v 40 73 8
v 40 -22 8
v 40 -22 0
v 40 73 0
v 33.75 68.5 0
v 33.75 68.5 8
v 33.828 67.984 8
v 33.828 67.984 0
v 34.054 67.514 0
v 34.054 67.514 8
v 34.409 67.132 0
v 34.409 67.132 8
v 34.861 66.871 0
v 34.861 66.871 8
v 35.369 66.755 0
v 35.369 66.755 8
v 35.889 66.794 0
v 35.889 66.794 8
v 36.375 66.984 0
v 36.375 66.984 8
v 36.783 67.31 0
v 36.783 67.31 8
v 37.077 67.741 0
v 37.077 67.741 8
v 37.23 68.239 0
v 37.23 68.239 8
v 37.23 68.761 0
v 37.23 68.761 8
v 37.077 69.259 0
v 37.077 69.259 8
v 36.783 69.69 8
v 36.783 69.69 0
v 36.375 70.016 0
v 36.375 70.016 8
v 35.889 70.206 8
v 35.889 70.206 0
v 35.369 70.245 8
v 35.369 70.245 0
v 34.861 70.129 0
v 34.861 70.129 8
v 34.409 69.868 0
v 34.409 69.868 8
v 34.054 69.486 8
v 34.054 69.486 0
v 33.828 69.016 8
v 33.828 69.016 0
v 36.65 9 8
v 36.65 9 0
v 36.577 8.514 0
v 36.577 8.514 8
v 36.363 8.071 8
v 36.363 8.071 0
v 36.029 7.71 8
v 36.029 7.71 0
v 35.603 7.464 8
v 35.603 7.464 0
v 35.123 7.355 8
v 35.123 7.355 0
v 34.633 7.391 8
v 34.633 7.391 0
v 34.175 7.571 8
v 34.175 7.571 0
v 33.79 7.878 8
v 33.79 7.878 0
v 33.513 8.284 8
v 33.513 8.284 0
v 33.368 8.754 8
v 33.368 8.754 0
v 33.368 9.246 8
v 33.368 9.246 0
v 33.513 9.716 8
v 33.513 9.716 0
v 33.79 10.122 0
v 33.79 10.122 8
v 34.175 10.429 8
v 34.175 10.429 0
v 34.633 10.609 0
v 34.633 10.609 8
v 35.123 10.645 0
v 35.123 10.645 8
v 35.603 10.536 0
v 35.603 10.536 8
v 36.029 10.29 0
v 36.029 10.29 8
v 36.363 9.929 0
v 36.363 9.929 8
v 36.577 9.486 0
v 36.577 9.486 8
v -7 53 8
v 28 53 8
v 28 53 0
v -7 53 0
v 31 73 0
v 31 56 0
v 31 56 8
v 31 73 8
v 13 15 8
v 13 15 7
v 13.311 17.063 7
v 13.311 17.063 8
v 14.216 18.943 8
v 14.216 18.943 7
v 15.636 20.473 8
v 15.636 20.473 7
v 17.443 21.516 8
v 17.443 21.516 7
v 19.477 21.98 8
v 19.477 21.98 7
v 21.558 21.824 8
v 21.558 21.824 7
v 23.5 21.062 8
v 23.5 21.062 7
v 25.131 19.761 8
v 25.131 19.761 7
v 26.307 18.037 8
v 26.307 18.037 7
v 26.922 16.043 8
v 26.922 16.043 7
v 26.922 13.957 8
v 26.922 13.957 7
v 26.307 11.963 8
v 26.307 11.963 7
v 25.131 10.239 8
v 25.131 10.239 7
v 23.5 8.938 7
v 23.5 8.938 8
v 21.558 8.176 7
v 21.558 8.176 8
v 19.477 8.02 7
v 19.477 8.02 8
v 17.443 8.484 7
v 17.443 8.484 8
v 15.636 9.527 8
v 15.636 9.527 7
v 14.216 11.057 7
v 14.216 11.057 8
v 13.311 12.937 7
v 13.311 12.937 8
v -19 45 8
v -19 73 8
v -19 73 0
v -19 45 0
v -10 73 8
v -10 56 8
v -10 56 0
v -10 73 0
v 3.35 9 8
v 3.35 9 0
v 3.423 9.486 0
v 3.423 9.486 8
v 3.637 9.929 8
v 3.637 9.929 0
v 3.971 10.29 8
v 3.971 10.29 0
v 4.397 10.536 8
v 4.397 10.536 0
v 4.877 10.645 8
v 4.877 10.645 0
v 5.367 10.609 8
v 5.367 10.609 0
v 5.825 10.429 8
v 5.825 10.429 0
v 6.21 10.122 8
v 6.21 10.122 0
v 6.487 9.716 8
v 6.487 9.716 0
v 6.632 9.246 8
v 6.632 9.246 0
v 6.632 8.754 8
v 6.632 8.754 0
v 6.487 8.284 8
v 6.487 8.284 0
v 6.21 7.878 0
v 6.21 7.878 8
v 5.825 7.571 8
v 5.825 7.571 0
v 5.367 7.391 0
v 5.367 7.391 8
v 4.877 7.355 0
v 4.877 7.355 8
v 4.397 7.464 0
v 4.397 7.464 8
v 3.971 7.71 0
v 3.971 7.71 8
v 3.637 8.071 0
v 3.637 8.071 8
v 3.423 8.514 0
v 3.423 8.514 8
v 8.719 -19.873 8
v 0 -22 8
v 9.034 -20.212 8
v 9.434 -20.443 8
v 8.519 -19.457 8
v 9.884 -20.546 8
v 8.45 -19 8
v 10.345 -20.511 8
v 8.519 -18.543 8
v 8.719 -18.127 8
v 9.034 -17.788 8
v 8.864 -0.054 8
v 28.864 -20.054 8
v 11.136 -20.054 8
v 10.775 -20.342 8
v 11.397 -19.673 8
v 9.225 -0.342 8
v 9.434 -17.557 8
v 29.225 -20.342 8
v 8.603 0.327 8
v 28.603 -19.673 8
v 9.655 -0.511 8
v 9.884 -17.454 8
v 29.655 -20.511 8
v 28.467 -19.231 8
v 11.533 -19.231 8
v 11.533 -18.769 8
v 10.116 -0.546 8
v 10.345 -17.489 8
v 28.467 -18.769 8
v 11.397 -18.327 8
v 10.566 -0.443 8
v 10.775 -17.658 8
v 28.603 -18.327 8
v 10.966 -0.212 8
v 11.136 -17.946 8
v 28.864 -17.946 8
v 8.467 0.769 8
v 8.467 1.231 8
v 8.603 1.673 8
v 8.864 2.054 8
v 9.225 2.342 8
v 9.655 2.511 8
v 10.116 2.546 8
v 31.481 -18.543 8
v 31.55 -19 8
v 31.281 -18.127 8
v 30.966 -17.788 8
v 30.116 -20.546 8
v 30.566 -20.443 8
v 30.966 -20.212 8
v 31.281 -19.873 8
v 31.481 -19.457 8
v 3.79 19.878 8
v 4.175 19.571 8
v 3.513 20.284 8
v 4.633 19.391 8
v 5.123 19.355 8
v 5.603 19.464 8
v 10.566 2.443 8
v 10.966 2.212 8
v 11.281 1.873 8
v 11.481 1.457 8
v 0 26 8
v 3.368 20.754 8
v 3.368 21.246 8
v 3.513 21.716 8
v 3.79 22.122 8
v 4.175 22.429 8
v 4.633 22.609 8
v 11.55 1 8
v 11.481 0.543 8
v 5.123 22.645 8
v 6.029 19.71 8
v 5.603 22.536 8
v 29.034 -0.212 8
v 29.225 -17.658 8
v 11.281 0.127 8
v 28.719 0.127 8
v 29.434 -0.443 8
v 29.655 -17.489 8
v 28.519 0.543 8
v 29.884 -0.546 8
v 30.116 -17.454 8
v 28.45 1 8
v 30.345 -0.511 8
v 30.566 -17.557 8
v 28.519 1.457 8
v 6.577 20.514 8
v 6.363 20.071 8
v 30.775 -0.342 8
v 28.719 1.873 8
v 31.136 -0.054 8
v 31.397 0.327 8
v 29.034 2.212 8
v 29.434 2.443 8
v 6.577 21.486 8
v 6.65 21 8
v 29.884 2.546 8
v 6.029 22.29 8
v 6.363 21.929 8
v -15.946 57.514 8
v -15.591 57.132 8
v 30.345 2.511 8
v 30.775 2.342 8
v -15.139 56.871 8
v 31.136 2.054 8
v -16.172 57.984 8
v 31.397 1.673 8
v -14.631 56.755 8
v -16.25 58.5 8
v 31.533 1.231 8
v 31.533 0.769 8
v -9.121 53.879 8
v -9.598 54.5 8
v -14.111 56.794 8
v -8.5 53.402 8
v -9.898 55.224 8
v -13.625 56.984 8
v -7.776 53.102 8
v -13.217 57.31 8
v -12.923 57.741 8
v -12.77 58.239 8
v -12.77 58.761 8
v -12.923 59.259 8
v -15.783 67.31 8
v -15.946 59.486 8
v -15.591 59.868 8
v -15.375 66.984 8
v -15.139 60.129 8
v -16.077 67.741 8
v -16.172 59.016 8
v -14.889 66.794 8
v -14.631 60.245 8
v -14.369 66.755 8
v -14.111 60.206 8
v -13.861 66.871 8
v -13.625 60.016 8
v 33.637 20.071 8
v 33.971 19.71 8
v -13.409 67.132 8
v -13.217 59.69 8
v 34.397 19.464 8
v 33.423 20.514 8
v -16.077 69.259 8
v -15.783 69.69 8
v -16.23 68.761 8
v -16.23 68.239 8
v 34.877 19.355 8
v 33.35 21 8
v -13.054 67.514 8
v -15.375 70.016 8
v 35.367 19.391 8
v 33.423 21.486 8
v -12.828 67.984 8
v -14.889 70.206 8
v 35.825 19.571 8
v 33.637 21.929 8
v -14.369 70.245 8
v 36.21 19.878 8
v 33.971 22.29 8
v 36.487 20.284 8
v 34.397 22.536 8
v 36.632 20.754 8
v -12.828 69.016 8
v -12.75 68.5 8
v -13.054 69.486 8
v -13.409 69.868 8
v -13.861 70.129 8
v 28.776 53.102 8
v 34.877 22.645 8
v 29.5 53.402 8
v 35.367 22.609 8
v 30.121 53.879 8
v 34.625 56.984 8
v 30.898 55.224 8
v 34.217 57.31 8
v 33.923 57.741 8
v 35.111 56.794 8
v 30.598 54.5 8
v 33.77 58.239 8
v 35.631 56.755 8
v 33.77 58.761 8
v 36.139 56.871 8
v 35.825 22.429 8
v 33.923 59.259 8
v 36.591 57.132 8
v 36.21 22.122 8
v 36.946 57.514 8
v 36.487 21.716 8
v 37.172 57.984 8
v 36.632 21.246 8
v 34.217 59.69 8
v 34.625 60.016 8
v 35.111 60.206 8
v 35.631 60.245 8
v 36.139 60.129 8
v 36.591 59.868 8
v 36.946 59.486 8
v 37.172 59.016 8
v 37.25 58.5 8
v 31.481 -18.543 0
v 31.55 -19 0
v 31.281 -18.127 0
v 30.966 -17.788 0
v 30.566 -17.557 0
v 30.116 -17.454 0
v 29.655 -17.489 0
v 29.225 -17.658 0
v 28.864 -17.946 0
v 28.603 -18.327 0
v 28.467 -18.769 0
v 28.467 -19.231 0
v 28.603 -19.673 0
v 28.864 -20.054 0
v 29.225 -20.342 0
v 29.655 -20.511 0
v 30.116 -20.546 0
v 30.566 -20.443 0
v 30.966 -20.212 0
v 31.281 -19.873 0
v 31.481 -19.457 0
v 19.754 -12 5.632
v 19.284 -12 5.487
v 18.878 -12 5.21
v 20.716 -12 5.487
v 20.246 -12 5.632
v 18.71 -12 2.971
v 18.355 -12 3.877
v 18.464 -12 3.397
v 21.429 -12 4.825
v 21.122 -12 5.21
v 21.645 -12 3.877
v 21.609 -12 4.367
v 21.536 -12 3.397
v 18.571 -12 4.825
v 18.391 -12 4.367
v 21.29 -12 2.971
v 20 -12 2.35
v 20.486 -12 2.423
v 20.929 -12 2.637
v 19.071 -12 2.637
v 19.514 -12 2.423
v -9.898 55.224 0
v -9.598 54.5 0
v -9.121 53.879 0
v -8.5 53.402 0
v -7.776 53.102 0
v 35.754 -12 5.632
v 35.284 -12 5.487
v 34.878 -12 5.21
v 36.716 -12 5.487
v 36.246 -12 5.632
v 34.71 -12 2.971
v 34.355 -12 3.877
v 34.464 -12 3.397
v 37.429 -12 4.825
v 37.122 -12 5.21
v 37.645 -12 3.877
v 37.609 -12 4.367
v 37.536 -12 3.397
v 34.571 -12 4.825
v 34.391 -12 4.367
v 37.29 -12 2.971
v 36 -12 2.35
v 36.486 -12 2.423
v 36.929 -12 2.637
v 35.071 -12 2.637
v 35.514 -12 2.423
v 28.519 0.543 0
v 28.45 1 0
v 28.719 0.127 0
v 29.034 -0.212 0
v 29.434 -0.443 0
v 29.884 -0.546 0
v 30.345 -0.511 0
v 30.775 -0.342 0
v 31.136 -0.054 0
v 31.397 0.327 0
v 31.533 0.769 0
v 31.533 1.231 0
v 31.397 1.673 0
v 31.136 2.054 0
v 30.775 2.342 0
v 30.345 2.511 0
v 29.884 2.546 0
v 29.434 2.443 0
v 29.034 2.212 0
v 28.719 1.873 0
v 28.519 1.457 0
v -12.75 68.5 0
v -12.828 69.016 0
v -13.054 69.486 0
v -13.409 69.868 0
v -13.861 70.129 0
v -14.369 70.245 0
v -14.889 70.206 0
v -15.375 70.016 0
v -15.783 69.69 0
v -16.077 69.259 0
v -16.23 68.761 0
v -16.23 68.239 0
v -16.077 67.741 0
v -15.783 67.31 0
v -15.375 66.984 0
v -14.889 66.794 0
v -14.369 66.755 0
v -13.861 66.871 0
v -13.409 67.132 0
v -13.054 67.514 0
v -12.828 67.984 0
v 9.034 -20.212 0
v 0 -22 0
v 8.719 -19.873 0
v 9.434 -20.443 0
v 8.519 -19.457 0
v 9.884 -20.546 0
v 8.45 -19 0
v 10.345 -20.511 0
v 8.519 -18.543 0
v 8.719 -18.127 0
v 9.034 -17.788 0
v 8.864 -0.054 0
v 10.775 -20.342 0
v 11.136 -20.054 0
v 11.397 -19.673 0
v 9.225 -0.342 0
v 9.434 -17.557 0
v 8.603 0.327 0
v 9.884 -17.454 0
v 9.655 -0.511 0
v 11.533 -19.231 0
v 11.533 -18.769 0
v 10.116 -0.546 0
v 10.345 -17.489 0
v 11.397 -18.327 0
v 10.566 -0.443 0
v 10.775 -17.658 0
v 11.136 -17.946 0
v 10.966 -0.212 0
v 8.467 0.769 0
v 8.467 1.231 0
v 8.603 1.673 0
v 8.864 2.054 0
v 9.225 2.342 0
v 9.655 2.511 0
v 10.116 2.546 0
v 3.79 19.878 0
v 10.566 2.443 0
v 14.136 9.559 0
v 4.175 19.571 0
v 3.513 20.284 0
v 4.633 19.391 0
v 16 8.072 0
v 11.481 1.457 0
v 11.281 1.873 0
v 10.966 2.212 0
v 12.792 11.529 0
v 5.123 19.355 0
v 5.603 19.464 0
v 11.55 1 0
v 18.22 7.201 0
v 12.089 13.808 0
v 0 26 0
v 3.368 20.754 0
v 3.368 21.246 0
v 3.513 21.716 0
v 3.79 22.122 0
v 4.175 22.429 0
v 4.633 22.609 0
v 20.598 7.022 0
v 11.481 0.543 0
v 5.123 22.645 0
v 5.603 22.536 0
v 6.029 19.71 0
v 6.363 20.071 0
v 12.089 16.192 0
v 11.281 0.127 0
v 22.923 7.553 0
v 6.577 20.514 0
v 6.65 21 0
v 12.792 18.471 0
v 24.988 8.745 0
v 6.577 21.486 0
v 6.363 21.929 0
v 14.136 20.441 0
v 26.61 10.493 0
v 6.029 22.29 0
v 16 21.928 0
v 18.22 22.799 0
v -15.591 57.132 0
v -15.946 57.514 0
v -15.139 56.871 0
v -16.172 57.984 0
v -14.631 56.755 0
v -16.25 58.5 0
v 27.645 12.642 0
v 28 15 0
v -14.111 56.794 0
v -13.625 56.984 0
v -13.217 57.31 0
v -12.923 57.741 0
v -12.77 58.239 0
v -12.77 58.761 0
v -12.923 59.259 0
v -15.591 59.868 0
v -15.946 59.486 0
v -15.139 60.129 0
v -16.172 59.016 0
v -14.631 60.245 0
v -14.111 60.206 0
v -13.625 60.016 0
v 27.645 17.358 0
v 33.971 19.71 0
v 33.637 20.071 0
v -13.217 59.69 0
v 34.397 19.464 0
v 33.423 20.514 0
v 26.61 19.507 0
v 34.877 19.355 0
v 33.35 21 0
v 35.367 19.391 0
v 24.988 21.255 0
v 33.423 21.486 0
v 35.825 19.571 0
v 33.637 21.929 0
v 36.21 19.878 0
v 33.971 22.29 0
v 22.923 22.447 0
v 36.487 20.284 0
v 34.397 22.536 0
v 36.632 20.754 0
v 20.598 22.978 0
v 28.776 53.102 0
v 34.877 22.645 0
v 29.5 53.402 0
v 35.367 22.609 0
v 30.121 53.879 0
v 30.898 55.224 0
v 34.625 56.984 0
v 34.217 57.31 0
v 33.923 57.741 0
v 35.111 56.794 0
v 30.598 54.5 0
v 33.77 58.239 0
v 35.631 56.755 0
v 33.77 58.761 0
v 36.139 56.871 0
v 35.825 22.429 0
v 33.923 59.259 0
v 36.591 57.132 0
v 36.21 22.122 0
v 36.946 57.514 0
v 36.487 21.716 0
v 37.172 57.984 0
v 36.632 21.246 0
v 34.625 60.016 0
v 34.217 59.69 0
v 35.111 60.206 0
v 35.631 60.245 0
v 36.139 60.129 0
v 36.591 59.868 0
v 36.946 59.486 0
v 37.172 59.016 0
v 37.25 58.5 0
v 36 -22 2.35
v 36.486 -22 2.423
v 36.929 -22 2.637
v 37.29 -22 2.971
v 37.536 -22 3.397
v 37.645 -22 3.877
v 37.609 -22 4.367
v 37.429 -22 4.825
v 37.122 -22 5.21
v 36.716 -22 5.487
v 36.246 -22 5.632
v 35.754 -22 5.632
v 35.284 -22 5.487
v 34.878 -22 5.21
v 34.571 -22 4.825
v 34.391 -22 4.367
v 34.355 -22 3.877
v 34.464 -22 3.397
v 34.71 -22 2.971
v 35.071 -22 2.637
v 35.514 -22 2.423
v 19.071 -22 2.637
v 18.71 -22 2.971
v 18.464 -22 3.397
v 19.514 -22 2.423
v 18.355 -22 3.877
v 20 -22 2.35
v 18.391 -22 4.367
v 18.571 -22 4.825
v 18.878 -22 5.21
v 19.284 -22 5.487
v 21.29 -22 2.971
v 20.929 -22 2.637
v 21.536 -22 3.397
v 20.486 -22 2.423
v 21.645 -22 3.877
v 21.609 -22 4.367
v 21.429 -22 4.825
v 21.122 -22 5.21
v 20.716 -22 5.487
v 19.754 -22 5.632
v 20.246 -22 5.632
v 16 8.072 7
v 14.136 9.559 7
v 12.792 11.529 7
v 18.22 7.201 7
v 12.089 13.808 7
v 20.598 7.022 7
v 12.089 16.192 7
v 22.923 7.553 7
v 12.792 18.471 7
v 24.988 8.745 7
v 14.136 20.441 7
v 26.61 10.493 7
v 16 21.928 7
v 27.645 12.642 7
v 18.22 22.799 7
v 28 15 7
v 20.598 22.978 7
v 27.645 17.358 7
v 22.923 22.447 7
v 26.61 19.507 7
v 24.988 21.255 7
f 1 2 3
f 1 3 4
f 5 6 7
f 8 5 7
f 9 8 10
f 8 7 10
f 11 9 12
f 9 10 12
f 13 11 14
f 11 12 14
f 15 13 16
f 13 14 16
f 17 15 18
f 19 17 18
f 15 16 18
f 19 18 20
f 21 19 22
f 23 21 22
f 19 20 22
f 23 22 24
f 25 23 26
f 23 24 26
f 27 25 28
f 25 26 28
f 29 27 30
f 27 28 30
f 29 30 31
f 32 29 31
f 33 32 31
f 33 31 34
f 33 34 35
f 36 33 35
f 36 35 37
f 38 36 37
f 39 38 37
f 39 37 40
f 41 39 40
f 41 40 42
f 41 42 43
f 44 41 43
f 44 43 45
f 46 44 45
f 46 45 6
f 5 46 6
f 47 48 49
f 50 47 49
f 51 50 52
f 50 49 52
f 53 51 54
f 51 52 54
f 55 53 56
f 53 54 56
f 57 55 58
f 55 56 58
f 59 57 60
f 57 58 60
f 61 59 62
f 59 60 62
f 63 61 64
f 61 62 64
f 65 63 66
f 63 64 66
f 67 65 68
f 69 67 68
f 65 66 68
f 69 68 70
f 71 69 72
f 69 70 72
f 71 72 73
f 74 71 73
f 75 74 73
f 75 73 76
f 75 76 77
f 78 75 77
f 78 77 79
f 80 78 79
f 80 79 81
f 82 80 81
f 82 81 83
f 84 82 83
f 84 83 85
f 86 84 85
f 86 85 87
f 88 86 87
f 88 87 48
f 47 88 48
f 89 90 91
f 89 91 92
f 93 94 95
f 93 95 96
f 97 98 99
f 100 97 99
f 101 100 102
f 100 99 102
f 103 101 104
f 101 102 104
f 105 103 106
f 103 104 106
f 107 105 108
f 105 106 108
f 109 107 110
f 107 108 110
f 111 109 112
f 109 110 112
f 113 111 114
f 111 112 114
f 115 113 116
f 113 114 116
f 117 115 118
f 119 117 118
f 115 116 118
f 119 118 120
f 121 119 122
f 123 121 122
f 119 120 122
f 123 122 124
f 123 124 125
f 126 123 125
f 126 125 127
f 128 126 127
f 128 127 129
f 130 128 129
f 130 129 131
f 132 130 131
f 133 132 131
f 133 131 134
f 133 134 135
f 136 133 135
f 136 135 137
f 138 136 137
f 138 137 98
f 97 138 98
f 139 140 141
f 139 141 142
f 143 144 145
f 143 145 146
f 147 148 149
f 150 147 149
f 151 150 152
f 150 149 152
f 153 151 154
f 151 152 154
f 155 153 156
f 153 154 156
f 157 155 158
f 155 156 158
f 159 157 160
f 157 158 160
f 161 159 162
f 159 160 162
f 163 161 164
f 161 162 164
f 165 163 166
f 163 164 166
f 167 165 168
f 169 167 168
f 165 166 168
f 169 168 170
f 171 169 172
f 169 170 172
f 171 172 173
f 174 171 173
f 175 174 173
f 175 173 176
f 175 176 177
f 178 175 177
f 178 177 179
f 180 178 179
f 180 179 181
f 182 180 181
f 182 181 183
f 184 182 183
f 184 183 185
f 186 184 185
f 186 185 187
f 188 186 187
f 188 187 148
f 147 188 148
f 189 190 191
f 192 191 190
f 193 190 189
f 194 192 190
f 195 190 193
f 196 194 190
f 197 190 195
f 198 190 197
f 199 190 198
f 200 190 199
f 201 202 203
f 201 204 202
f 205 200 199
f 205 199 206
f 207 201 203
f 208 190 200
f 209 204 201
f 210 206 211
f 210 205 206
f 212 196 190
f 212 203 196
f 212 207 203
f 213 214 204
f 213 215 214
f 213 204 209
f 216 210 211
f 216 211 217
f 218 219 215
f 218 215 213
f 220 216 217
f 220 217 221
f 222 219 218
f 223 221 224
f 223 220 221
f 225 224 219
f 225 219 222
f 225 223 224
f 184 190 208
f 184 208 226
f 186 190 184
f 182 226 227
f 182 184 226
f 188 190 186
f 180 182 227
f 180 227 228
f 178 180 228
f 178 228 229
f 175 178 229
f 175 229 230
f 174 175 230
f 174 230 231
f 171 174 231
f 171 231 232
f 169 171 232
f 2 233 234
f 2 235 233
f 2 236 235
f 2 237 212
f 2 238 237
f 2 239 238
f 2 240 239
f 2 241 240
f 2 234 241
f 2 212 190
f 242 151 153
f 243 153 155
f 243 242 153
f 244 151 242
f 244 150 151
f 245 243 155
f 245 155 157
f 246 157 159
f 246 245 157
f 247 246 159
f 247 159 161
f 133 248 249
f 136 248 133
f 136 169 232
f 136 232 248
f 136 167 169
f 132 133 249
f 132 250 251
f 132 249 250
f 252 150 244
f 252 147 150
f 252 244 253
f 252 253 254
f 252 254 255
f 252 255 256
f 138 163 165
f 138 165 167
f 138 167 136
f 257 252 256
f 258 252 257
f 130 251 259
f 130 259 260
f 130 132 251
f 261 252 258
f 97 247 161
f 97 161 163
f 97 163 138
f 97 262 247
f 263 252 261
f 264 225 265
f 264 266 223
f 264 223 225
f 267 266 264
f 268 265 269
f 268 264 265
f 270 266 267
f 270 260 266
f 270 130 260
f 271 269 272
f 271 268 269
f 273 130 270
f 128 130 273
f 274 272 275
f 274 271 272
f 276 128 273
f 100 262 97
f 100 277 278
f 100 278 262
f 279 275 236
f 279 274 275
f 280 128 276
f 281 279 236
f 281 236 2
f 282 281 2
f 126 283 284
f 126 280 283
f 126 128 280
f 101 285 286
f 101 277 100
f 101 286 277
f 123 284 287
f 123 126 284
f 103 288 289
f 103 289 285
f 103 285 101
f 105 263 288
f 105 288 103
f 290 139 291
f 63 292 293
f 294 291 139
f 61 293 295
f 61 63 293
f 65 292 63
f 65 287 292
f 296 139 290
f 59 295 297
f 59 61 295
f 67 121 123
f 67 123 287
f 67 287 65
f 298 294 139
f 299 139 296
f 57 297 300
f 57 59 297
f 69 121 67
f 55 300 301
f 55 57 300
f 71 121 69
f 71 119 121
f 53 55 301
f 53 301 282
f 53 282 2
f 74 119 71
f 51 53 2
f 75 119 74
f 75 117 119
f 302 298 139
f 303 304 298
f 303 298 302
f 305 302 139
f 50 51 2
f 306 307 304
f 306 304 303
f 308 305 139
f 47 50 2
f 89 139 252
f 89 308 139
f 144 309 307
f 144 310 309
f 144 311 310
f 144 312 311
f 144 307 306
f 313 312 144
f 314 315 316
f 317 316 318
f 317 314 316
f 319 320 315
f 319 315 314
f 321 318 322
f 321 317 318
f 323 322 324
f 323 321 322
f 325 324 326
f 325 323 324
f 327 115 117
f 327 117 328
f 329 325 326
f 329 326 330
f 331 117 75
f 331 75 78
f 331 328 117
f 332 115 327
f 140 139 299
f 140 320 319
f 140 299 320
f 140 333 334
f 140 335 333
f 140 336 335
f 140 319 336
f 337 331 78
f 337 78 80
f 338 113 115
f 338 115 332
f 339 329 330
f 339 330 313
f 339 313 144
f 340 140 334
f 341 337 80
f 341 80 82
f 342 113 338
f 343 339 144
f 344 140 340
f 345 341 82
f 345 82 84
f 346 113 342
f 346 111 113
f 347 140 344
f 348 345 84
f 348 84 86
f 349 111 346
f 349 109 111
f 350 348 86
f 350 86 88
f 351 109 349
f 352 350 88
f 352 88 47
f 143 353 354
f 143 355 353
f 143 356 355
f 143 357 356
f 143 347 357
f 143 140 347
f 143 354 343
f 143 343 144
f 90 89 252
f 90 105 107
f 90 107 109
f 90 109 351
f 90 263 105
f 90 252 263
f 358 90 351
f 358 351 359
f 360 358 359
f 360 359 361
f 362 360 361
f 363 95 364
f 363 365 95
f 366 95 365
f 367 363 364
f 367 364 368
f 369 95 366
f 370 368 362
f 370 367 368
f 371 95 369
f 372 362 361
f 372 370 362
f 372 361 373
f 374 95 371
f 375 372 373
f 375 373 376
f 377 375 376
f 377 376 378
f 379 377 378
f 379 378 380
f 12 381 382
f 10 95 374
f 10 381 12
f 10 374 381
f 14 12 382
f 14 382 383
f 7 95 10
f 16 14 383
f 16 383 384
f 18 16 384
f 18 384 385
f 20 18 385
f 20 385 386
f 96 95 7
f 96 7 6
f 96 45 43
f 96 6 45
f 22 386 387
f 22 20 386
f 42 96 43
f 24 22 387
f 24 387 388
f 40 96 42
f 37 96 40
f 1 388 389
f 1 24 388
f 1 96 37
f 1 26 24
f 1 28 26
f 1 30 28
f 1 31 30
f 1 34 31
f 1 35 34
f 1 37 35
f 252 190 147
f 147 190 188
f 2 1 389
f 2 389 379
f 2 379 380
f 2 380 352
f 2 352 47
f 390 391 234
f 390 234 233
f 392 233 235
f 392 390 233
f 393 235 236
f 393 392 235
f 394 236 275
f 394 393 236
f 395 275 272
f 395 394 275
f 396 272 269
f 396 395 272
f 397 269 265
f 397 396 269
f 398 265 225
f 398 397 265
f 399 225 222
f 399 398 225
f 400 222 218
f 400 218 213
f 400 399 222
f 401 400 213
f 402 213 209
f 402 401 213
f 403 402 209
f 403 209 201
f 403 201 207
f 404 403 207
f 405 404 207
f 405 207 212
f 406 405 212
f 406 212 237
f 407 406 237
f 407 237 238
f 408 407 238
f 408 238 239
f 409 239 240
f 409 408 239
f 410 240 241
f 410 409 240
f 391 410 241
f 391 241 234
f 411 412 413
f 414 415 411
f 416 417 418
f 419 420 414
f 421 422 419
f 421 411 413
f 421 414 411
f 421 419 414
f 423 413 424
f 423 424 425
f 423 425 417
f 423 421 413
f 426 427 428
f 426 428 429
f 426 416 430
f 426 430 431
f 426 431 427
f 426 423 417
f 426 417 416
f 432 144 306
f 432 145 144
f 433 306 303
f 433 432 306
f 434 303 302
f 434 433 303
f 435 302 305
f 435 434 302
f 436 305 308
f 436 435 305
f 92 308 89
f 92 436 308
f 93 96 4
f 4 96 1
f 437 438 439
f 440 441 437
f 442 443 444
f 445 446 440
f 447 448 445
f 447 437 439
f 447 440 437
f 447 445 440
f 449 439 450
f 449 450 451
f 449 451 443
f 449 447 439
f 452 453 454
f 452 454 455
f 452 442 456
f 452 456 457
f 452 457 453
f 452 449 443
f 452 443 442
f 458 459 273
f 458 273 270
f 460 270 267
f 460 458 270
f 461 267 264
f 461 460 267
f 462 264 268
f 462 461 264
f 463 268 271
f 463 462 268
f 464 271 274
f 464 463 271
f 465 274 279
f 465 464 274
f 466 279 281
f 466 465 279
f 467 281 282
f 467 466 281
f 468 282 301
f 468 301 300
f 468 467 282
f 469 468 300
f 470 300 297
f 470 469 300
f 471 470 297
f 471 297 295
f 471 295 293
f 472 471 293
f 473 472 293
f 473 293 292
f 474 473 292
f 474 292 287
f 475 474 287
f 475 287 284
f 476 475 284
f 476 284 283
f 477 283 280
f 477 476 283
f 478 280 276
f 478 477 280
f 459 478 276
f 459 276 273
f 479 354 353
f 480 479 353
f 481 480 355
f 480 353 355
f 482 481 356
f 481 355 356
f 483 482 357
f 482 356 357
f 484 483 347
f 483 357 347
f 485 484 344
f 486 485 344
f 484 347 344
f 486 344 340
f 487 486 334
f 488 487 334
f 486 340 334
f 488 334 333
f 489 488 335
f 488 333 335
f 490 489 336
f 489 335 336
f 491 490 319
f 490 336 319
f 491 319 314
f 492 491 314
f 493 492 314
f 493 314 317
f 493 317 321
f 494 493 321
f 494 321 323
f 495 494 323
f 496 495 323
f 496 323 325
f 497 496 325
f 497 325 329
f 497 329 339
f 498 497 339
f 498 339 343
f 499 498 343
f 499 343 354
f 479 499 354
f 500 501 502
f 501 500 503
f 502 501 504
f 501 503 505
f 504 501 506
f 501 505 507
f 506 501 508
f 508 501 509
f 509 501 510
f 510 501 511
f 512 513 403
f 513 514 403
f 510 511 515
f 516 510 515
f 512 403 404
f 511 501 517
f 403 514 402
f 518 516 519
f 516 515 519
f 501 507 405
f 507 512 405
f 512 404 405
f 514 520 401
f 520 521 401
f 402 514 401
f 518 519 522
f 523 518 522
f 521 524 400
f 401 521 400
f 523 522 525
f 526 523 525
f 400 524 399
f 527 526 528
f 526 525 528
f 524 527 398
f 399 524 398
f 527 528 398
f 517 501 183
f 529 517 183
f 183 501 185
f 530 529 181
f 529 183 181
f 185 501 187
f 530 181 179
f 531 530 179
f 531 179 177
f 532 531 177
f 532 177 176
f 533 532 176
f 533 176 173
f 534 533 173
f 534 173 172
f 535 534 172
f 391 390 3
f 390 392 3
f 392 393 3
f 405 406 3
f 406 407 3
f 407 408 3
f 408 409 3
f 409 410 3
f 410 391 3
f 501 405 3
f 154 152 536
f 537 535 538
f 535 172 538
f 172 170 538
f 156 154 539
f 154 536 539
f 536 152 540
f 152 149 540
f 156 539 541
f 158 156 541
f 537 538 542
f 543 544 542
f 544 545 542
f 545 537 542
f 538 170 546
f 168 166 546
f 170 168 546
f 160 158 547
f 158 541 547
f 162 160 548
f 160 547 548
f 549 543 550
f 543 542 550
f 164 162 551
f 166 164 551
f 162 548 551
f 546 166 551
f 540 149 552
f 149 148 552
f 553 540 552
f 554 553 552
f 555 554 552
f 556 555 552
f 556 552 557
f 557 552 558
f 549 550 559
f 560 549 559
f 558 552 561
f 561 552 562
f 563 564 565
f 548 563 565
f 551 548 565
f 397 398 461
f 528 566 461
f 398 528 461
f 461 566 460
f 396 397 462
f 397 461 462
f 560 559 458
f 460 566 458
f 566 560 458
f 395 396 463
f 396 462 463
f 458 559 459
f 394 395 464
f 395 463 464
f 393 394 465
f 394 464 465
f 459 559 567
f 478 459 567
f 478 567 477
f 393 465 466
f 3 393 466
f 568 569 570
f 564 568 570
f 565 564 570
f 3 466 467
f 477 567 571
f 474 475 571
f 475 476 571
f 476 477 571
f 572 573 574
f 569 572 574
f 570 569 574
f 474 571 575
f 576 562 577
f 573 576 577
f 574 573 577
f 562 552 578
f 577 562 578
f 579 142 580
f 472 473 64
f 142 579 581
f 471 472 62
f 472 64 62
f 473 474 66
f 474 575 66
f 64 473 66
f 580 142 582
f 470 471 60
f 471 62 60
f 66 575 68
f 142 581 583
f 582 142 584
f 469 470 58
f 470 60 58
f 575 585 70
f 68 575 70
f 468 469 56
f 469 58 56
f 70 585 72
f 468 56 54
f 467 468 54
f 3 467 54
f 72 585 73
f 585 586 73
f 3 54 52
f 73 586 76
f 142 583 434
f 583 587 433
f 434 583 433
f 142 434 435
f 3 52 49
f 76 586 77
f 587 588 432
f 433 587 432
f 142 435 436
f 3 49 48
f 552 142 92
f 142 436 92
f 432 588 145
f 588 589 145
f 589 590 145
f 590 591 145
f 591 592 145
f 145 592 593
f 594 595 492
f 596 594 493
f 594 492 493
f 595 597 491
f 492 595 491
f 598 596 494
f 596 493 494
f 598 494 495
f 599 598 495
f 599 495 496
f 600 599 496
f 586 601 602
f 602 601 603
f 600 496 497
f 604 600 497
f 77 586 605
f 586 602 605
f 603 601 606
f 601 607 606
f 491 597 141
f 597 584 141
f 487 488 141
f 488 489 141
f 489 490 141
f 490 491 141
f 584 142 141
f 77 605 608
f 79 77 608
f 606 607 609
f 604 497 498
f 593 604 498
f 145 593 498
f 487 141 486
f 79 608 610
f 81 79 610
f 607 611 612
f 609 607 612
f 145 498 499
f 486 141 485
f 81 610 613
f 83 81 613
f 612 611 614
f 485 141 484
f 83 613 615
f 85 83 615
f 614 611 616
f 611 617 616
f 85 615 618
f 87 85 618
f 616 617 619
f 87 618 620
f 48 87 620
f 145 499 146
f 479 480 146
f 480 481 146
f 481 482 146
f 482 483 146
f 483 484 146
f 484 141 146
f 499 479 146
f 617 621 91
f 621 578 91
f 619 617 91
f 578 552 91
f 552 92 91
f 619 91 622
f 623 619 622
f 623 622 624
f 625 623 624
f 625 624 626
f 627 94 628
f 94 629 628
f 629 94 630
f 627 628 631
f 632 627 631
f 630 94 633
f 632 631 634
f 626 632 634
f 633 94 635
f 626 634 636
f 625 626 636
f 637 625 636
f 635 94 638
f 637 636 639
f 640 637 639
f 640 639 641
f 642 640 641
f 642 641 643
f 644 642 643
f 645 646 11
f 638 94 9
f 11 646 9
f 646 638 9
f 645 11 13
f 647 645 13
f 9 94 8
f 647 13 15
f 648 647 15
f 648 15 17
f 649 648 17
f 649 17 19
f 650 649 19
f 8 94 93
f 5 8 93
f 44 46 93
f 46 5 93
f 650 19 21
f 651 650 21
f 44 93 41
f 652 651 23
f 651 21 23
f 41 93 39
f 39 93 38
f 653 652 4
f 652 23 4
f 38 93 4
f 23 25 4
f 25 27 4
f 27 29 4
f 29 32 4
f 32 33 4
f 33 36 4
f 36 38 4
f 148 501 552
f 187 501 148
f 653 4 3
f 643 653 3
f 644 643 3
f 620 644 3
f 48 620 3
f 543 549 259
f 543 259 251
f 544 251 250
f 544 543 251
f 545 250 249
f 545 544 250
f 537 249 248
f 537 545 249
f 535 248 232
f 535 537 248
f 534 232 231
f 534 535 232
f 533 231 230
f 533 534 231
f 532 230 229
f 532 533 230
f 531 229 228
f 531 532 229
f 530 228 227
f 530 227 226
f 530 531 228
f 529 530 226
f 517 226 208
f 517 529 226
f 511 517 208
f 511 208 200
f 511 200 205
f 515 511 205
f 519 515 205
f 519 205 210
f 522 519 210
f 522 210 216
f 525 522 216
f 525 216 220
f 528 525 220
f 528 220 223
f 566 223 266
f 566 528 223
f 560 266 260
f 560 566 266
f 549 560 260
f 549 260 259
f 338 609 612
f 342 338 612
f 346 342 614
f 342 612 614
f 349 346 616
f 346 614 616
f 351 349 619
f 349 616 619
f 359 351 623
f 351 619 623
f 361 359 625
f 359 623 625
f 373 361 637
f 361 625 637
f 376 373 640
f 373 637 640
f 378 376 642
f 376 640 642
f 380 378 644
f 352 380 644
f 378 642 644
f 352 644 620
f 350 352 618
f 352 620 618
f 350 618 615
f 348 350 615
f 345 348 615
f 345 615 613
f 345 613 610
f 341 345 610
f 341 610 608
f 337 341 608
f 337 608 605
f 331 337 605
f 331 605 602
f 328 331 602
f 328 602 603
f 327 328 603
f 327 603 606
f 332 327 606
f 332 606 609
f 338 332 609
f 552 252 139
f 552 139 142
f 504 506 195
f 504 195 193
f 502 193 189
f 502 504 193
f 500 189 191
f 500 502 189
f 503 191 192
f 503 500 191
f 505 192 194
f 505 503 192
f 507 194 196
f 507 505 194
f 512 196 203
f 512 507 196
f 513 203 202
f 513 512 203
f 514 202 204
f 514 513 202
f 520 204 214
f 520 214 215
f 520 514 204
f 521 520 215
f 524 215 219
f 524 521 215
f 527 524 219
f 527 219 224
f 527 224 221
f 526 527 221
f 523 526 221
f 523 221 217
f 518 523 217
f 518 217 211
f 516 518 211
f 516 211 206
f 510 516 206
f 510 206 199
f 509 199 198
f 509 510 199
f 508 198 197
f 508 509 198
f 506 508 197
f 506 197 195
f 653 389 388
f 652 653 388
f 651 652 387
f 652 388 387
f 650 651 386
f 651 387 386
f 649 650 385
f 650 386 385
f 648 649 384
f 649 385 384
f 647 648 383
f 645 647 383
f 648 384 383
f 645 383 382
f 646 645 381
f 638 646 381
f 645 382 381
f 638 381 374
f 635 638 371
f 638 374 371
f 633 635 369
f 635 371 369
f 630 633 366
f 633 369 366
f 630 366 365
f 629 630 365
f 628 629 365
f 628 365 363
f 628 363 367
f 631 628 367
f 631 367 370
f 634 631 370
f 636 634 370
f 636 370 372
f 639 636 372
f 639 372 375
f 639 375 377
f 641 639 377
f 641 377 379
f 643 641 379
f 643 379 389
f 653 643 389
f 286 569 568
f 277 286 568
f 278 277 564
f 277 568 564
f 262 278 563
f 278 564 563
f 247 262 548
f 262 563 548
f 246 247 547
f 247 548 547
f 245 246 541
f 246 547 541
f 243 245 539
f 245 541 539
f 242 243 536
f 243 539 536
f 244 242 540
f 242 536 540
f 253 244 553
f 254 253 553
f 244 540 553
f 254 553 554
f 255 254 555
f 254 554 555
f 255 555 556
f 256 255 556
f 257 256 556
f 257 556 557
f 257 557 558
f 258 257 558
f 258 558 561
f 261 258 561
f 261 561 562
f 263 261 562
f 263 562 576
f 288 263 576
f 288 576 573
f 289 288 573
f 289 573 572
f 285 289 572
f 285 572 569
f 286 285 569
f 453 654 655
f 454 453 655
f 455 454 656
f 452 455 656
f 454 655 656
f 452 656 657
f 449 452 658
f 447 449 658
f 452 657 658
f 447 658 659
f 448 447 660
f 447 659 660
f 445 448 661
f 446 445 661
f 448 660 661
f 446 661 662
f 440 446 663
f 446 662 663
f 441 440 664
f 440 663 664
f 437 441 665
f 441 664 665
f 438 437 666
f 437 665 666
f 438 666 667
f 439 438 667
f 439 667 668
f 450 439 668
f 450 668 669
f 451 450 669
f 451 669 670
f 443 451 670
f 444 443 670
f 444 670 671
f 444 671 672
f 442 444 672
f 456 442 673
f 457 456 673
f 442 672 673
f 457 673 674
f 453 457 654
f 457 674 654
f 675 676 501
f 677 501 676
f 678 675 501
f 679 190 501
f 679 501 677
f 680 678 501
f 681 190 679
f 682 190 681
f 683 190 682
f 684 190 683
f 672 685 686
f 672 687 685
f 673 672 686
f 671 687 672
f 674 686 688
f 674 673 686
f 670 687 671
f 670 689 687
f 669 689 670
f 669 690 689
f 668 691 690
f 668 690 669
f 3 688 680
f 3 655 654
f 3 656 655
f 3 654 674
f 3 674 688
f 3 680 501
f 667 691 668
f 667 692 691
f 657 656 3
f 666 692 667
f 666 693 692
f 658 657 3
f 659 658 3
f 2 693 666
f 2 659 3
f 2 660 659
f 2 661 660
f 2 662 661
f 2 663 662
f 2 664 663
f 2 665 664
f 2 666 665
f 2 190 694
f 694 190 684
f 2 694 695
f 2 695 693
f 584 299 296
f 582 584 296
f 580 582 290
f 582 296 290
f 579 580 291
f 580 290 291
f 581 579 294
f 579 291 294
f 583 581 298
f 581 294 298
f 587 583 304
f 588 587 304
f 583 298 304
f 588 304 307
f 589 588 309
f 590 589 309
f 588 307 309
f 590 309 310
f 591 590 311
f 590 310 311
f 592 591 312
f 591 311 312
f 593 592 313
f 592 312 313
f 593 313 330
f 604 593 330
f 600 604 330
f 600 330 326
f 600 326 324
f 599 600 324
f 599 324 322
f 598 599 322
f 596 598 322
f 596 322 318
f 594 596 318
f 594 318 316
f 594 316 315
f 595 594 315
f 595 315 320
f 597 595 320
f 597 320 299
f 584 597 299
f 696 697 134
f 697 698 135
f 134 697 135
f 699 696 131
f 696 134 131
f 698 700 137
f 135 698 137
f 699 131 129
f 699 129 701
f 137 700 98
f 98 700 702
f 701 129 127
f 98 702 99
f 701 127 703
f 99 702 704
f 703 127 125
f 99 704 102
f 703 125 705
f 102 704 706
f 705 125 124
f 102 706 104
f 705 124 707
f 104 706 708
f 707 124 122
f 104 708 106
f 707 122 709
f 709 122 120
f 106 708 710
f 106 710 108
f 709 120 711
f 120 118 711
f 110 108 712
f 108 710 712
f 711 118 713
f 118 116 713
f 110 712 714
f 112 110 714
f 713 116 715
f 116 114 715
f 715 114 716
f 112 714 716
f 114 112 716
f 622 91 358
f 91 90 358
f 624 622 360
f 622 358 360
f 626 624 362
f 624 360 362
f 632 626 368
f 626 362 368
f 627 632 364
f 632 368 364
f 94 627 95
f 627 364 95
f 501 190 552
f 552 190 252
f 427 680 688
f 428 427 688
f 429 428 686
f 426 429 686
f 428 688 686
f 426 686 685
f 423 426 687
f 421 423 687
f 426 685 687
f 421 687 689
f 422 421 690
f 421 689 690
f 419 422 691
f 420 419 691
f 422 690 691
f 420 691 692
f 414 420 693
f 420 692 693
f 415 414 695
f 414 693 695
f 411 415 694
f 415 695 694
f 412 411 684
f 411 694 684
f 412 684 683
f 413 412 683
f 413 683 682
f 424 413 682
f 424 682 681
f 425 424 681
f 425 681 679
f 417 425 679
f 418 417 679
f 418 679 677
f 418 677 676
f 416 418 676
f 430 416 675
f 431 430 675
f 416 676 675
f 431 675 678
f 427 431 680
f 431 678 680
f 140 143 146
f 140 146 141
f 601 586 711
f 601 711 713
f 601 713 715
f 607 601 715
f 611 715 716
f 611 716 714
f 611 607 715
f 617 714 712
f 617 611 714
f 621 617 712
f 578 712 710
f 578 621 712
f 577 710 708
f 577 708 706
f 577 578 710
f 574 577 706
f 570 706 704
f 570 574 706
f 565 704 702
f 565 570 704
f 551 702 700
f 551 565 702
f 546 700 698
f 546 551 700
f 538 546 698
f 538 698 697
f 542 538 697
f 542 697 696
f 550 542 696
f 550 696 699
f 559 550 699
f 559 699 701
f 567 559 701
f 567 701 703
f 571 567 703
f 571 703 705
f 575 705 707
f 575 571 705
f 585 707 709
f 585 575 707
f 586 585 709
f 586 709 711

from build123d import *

# Parameters (mm, degrees)
ESQUISSE1_W             = 40
ESQUISSE1_H             = 30
BOSS_EXTRU_1_DEPTH      = 8
ENL_V_START             = -8
ESQUISSE2_R             = 8
ENL_V_MAT_EXTRU_1_DEPTH = 7
ESQUISSE3_W             = 40
ESQUISSE3_H             = 22
BOSS_EXTRU_2_DEPTH      = 8
ESQUISSE4_R             = 1.55
ENL_V_MAT_EXTRU_2_DEPTH = 8
ESQUISSE5_W             = 40
ESQUISSE5_H             = 43
BOSS_EXTRU_3_DEPTH      = 8
ESQUISSE6_W             = 31
ESQUISSE6_H             = 20
ENL_V_MAT_EXTRU_3_DEPTH = 8
BOSS_EXTRU_4_DEPTH      = 8
ESQUISSE8_R             = 1.75
ENL_V_MAT_EXTRU_4_DEPTH = 84.624159189
ESQUISSE9_R             = 7
ENL_V_MAT_EXTRU_5_DEPTH = 84.534424042
ESQUISSE10_R            = 1.65
ENL_V_MAT_EXTRU_6_DEPTH = 10
ESQUISSE11_R            = 1.65
ENL_V_MAT_EXTRU_7_DEPTH = 84.624159189
CHANFREIN1_SIZE         = 19
CONG_1_R                = 3


with BuildPart() as part:
    # Esquisse1 → Boss.-Extru.1 (new body)
    with BuildSketch(Plane.XY):
        with Locations((20, 15)):
            Rectangle(ESQUISSE1_W, ESQUISSE1_H)
    extrude(amount=BOSS_EXTRU_1_DEPTH)

    # Esquisse2 → Enlèv. mat.-Extru.1 (cut)
    with BuildSketch(Plane.XY.offset(8).offset(ENL_V_START)):
        with Locations((20, 15)):
            Circle(ESQUISSE2_R)
    extrude(amount=ENL_V_MAT_EXTRU_1_DEPTH, mode=Mode.SUBTRACT)

    # Esquisse3 → Boss.-Extru.2 (add)
    with BuildSketch(Plane.XY.offset(8)):
        with Locations((20, -11)):
            Rectangle(ESQUISSE3_W, ESQUISSE3_H)
    extrude(amount=-BOSS_EXTRU_2_DEPTH)

    # Esquisse4 → Enlèv. mat.-Extru.2 (cut)
    with BuildSketch(Plane.XY.offset(8).offset(ENL_V_START)):
        with Locations((30, -19)):
            Circle(ESQUISSE4_R)
        with Locations(Location((30, 1, 0), (0, 0, 180))):
            Circle(ESQUISSE4_R)
        with Locations((10, 1)):
            Circle(ESQUISSE4_R)
        with Locations(Location((10, -19, 0), (0, 0, 180))):
            Circle(ESQUISSE4_R)
    extrude(amount=ENL_V_MAT_EXTRU_2_DEPTH, mode=Mode.SUBTRACT)

    # Esquisse5 → Boss.-Extru.3 (add)
    with BuildSketch(Plane.XY.offset(8)):
        with Locations((20, 51.5)):
            Rectangle(ESQUISSE5_W, ESQUISSE5_H)
    extrude(amount=-BOSS_EXTRU_3_DEPTH)

    # Esquisse6 → Enlèv. mat.-Extru.3 (cut)
    with BuildSketch(Plane.XY.offset(8).offset(ENL_V_START)):
        with Locations((15.5, 63)):
            Rectangle(ESQUISSE6_W, ESQUISSE6_H)
    extrude(amount=ENL_V_MAT_EXTRU_3_DEPTH, mode=Mode.SUBTRACT)

    # Esquisse7 → Boss.-Extru.4 (add)
    with BuildSketch(Plane.XY.offset(8)):
        Polygon((0, 53), (-10, 53), (-10, 73), (-19, 73), (-19, 45), (0, 45), align=None)
    extrude(amount=-BOSS_EXTRU_4_DEPTH)

    # Esquisse8 → Enlèv. mat.-Extru.4 (cut, through all)
    with BuildSketch(Plane.XY.offset(8)):
        with Locations((35.5, 58.5)):
            Circle(ESQUISSE8_R)
        with Locations(Location((35.5, 68.5, 0), (0, 0, 180))):
            Circle(ESQUISSE8_R)
        with Locations((-14.5, 68.5)):
            Circle(ESQUISSE8_R)
        with Locations(Location((-14.5, 58.5, 0), (0, 0, 180))):
            Circle(ESQUISSE8_R)
    extrude(amount=-ENL_V_MAT_EXTRU_4_DEPTH, mode=Mode.SUBTRACT)

    # Esquisse9 → Enlèv. mat.-Extru.5 (cut, through all)
    with BuildSketch(Plane(origin=(0, 0, 7), x_dir=(-1, 0, 0), z_dir=(0, 0, -1))):
        with Locations((-20, 15)):
            Circle(ESQUISSE9_R)
    extrude(amount=-ENL_V_MAT_EXTRU_5_DEPTH, mode=Mode.SUBTRACT)

    # Esquisse10 → Enlèv. mat.-Extru.6 (cut)
    with BuildSketch(Plane(origin=(0, -22, 0), x_dir=(-1, 0, 0), z_dir=(0, -1, 0))):
        with Locations(Location((-20, -4, 0), (0, 0, 90))):
            Circle(ESQUISSE10_R)
        with Locations(Location((-36, -4, 0), (0, 0, 90))):
            Circle(ESQUISSE10_R)
    extrude(amount=-ENL_V_MAT_EXTRU_6_DEPTH, mode=Mode.SUBTRACT)

    # Esquisse11 → Enlèv. mat.-Extru.7 (cut, through all)
    with BuildSketch(Plane(origin=(0, 0, 0), x_dir=(-1, 0, 0), z_dir=(0, 0, -1))):
        with Locations((-35, 21)):
            Circle(ESQUISSE11_R)
        with Locations(Location((-5, 21, 0), (0, 0, 180))):
            Circle(ESQUISSE11_R)
        with Locations((-5, 9)):
            Circle(ESQUISSE11_R)
        with Locations(Location((-35, 9, 0), (0, 0, 180))):
            Circle(ESQUISSE11_R)
    extrude(amount=-ENL_V_MAT_EXTRU_7_DEPTH, mode=Mode.SUBTRACT)

    # Chanfrein1
    chanfrein1_edges = [part.edges().sort_by_distance(p)[0] for p in [
        (0, 45, 4),
    ]]
    chamfer(chanfrein1_edges, length=CHANFREIN1_SIZE - 0.0001)  # a hair under: the kernel refuses the full size

    # Congé1
    cong_1_edges = [part.edges().sort_by_distance(p)[0] for p in [
        (31, 53, 4),
        (-10, 53, 4),
    ]]
    fillet(cong_1_edges, radius=CONG_1_R)


solid = part.part
